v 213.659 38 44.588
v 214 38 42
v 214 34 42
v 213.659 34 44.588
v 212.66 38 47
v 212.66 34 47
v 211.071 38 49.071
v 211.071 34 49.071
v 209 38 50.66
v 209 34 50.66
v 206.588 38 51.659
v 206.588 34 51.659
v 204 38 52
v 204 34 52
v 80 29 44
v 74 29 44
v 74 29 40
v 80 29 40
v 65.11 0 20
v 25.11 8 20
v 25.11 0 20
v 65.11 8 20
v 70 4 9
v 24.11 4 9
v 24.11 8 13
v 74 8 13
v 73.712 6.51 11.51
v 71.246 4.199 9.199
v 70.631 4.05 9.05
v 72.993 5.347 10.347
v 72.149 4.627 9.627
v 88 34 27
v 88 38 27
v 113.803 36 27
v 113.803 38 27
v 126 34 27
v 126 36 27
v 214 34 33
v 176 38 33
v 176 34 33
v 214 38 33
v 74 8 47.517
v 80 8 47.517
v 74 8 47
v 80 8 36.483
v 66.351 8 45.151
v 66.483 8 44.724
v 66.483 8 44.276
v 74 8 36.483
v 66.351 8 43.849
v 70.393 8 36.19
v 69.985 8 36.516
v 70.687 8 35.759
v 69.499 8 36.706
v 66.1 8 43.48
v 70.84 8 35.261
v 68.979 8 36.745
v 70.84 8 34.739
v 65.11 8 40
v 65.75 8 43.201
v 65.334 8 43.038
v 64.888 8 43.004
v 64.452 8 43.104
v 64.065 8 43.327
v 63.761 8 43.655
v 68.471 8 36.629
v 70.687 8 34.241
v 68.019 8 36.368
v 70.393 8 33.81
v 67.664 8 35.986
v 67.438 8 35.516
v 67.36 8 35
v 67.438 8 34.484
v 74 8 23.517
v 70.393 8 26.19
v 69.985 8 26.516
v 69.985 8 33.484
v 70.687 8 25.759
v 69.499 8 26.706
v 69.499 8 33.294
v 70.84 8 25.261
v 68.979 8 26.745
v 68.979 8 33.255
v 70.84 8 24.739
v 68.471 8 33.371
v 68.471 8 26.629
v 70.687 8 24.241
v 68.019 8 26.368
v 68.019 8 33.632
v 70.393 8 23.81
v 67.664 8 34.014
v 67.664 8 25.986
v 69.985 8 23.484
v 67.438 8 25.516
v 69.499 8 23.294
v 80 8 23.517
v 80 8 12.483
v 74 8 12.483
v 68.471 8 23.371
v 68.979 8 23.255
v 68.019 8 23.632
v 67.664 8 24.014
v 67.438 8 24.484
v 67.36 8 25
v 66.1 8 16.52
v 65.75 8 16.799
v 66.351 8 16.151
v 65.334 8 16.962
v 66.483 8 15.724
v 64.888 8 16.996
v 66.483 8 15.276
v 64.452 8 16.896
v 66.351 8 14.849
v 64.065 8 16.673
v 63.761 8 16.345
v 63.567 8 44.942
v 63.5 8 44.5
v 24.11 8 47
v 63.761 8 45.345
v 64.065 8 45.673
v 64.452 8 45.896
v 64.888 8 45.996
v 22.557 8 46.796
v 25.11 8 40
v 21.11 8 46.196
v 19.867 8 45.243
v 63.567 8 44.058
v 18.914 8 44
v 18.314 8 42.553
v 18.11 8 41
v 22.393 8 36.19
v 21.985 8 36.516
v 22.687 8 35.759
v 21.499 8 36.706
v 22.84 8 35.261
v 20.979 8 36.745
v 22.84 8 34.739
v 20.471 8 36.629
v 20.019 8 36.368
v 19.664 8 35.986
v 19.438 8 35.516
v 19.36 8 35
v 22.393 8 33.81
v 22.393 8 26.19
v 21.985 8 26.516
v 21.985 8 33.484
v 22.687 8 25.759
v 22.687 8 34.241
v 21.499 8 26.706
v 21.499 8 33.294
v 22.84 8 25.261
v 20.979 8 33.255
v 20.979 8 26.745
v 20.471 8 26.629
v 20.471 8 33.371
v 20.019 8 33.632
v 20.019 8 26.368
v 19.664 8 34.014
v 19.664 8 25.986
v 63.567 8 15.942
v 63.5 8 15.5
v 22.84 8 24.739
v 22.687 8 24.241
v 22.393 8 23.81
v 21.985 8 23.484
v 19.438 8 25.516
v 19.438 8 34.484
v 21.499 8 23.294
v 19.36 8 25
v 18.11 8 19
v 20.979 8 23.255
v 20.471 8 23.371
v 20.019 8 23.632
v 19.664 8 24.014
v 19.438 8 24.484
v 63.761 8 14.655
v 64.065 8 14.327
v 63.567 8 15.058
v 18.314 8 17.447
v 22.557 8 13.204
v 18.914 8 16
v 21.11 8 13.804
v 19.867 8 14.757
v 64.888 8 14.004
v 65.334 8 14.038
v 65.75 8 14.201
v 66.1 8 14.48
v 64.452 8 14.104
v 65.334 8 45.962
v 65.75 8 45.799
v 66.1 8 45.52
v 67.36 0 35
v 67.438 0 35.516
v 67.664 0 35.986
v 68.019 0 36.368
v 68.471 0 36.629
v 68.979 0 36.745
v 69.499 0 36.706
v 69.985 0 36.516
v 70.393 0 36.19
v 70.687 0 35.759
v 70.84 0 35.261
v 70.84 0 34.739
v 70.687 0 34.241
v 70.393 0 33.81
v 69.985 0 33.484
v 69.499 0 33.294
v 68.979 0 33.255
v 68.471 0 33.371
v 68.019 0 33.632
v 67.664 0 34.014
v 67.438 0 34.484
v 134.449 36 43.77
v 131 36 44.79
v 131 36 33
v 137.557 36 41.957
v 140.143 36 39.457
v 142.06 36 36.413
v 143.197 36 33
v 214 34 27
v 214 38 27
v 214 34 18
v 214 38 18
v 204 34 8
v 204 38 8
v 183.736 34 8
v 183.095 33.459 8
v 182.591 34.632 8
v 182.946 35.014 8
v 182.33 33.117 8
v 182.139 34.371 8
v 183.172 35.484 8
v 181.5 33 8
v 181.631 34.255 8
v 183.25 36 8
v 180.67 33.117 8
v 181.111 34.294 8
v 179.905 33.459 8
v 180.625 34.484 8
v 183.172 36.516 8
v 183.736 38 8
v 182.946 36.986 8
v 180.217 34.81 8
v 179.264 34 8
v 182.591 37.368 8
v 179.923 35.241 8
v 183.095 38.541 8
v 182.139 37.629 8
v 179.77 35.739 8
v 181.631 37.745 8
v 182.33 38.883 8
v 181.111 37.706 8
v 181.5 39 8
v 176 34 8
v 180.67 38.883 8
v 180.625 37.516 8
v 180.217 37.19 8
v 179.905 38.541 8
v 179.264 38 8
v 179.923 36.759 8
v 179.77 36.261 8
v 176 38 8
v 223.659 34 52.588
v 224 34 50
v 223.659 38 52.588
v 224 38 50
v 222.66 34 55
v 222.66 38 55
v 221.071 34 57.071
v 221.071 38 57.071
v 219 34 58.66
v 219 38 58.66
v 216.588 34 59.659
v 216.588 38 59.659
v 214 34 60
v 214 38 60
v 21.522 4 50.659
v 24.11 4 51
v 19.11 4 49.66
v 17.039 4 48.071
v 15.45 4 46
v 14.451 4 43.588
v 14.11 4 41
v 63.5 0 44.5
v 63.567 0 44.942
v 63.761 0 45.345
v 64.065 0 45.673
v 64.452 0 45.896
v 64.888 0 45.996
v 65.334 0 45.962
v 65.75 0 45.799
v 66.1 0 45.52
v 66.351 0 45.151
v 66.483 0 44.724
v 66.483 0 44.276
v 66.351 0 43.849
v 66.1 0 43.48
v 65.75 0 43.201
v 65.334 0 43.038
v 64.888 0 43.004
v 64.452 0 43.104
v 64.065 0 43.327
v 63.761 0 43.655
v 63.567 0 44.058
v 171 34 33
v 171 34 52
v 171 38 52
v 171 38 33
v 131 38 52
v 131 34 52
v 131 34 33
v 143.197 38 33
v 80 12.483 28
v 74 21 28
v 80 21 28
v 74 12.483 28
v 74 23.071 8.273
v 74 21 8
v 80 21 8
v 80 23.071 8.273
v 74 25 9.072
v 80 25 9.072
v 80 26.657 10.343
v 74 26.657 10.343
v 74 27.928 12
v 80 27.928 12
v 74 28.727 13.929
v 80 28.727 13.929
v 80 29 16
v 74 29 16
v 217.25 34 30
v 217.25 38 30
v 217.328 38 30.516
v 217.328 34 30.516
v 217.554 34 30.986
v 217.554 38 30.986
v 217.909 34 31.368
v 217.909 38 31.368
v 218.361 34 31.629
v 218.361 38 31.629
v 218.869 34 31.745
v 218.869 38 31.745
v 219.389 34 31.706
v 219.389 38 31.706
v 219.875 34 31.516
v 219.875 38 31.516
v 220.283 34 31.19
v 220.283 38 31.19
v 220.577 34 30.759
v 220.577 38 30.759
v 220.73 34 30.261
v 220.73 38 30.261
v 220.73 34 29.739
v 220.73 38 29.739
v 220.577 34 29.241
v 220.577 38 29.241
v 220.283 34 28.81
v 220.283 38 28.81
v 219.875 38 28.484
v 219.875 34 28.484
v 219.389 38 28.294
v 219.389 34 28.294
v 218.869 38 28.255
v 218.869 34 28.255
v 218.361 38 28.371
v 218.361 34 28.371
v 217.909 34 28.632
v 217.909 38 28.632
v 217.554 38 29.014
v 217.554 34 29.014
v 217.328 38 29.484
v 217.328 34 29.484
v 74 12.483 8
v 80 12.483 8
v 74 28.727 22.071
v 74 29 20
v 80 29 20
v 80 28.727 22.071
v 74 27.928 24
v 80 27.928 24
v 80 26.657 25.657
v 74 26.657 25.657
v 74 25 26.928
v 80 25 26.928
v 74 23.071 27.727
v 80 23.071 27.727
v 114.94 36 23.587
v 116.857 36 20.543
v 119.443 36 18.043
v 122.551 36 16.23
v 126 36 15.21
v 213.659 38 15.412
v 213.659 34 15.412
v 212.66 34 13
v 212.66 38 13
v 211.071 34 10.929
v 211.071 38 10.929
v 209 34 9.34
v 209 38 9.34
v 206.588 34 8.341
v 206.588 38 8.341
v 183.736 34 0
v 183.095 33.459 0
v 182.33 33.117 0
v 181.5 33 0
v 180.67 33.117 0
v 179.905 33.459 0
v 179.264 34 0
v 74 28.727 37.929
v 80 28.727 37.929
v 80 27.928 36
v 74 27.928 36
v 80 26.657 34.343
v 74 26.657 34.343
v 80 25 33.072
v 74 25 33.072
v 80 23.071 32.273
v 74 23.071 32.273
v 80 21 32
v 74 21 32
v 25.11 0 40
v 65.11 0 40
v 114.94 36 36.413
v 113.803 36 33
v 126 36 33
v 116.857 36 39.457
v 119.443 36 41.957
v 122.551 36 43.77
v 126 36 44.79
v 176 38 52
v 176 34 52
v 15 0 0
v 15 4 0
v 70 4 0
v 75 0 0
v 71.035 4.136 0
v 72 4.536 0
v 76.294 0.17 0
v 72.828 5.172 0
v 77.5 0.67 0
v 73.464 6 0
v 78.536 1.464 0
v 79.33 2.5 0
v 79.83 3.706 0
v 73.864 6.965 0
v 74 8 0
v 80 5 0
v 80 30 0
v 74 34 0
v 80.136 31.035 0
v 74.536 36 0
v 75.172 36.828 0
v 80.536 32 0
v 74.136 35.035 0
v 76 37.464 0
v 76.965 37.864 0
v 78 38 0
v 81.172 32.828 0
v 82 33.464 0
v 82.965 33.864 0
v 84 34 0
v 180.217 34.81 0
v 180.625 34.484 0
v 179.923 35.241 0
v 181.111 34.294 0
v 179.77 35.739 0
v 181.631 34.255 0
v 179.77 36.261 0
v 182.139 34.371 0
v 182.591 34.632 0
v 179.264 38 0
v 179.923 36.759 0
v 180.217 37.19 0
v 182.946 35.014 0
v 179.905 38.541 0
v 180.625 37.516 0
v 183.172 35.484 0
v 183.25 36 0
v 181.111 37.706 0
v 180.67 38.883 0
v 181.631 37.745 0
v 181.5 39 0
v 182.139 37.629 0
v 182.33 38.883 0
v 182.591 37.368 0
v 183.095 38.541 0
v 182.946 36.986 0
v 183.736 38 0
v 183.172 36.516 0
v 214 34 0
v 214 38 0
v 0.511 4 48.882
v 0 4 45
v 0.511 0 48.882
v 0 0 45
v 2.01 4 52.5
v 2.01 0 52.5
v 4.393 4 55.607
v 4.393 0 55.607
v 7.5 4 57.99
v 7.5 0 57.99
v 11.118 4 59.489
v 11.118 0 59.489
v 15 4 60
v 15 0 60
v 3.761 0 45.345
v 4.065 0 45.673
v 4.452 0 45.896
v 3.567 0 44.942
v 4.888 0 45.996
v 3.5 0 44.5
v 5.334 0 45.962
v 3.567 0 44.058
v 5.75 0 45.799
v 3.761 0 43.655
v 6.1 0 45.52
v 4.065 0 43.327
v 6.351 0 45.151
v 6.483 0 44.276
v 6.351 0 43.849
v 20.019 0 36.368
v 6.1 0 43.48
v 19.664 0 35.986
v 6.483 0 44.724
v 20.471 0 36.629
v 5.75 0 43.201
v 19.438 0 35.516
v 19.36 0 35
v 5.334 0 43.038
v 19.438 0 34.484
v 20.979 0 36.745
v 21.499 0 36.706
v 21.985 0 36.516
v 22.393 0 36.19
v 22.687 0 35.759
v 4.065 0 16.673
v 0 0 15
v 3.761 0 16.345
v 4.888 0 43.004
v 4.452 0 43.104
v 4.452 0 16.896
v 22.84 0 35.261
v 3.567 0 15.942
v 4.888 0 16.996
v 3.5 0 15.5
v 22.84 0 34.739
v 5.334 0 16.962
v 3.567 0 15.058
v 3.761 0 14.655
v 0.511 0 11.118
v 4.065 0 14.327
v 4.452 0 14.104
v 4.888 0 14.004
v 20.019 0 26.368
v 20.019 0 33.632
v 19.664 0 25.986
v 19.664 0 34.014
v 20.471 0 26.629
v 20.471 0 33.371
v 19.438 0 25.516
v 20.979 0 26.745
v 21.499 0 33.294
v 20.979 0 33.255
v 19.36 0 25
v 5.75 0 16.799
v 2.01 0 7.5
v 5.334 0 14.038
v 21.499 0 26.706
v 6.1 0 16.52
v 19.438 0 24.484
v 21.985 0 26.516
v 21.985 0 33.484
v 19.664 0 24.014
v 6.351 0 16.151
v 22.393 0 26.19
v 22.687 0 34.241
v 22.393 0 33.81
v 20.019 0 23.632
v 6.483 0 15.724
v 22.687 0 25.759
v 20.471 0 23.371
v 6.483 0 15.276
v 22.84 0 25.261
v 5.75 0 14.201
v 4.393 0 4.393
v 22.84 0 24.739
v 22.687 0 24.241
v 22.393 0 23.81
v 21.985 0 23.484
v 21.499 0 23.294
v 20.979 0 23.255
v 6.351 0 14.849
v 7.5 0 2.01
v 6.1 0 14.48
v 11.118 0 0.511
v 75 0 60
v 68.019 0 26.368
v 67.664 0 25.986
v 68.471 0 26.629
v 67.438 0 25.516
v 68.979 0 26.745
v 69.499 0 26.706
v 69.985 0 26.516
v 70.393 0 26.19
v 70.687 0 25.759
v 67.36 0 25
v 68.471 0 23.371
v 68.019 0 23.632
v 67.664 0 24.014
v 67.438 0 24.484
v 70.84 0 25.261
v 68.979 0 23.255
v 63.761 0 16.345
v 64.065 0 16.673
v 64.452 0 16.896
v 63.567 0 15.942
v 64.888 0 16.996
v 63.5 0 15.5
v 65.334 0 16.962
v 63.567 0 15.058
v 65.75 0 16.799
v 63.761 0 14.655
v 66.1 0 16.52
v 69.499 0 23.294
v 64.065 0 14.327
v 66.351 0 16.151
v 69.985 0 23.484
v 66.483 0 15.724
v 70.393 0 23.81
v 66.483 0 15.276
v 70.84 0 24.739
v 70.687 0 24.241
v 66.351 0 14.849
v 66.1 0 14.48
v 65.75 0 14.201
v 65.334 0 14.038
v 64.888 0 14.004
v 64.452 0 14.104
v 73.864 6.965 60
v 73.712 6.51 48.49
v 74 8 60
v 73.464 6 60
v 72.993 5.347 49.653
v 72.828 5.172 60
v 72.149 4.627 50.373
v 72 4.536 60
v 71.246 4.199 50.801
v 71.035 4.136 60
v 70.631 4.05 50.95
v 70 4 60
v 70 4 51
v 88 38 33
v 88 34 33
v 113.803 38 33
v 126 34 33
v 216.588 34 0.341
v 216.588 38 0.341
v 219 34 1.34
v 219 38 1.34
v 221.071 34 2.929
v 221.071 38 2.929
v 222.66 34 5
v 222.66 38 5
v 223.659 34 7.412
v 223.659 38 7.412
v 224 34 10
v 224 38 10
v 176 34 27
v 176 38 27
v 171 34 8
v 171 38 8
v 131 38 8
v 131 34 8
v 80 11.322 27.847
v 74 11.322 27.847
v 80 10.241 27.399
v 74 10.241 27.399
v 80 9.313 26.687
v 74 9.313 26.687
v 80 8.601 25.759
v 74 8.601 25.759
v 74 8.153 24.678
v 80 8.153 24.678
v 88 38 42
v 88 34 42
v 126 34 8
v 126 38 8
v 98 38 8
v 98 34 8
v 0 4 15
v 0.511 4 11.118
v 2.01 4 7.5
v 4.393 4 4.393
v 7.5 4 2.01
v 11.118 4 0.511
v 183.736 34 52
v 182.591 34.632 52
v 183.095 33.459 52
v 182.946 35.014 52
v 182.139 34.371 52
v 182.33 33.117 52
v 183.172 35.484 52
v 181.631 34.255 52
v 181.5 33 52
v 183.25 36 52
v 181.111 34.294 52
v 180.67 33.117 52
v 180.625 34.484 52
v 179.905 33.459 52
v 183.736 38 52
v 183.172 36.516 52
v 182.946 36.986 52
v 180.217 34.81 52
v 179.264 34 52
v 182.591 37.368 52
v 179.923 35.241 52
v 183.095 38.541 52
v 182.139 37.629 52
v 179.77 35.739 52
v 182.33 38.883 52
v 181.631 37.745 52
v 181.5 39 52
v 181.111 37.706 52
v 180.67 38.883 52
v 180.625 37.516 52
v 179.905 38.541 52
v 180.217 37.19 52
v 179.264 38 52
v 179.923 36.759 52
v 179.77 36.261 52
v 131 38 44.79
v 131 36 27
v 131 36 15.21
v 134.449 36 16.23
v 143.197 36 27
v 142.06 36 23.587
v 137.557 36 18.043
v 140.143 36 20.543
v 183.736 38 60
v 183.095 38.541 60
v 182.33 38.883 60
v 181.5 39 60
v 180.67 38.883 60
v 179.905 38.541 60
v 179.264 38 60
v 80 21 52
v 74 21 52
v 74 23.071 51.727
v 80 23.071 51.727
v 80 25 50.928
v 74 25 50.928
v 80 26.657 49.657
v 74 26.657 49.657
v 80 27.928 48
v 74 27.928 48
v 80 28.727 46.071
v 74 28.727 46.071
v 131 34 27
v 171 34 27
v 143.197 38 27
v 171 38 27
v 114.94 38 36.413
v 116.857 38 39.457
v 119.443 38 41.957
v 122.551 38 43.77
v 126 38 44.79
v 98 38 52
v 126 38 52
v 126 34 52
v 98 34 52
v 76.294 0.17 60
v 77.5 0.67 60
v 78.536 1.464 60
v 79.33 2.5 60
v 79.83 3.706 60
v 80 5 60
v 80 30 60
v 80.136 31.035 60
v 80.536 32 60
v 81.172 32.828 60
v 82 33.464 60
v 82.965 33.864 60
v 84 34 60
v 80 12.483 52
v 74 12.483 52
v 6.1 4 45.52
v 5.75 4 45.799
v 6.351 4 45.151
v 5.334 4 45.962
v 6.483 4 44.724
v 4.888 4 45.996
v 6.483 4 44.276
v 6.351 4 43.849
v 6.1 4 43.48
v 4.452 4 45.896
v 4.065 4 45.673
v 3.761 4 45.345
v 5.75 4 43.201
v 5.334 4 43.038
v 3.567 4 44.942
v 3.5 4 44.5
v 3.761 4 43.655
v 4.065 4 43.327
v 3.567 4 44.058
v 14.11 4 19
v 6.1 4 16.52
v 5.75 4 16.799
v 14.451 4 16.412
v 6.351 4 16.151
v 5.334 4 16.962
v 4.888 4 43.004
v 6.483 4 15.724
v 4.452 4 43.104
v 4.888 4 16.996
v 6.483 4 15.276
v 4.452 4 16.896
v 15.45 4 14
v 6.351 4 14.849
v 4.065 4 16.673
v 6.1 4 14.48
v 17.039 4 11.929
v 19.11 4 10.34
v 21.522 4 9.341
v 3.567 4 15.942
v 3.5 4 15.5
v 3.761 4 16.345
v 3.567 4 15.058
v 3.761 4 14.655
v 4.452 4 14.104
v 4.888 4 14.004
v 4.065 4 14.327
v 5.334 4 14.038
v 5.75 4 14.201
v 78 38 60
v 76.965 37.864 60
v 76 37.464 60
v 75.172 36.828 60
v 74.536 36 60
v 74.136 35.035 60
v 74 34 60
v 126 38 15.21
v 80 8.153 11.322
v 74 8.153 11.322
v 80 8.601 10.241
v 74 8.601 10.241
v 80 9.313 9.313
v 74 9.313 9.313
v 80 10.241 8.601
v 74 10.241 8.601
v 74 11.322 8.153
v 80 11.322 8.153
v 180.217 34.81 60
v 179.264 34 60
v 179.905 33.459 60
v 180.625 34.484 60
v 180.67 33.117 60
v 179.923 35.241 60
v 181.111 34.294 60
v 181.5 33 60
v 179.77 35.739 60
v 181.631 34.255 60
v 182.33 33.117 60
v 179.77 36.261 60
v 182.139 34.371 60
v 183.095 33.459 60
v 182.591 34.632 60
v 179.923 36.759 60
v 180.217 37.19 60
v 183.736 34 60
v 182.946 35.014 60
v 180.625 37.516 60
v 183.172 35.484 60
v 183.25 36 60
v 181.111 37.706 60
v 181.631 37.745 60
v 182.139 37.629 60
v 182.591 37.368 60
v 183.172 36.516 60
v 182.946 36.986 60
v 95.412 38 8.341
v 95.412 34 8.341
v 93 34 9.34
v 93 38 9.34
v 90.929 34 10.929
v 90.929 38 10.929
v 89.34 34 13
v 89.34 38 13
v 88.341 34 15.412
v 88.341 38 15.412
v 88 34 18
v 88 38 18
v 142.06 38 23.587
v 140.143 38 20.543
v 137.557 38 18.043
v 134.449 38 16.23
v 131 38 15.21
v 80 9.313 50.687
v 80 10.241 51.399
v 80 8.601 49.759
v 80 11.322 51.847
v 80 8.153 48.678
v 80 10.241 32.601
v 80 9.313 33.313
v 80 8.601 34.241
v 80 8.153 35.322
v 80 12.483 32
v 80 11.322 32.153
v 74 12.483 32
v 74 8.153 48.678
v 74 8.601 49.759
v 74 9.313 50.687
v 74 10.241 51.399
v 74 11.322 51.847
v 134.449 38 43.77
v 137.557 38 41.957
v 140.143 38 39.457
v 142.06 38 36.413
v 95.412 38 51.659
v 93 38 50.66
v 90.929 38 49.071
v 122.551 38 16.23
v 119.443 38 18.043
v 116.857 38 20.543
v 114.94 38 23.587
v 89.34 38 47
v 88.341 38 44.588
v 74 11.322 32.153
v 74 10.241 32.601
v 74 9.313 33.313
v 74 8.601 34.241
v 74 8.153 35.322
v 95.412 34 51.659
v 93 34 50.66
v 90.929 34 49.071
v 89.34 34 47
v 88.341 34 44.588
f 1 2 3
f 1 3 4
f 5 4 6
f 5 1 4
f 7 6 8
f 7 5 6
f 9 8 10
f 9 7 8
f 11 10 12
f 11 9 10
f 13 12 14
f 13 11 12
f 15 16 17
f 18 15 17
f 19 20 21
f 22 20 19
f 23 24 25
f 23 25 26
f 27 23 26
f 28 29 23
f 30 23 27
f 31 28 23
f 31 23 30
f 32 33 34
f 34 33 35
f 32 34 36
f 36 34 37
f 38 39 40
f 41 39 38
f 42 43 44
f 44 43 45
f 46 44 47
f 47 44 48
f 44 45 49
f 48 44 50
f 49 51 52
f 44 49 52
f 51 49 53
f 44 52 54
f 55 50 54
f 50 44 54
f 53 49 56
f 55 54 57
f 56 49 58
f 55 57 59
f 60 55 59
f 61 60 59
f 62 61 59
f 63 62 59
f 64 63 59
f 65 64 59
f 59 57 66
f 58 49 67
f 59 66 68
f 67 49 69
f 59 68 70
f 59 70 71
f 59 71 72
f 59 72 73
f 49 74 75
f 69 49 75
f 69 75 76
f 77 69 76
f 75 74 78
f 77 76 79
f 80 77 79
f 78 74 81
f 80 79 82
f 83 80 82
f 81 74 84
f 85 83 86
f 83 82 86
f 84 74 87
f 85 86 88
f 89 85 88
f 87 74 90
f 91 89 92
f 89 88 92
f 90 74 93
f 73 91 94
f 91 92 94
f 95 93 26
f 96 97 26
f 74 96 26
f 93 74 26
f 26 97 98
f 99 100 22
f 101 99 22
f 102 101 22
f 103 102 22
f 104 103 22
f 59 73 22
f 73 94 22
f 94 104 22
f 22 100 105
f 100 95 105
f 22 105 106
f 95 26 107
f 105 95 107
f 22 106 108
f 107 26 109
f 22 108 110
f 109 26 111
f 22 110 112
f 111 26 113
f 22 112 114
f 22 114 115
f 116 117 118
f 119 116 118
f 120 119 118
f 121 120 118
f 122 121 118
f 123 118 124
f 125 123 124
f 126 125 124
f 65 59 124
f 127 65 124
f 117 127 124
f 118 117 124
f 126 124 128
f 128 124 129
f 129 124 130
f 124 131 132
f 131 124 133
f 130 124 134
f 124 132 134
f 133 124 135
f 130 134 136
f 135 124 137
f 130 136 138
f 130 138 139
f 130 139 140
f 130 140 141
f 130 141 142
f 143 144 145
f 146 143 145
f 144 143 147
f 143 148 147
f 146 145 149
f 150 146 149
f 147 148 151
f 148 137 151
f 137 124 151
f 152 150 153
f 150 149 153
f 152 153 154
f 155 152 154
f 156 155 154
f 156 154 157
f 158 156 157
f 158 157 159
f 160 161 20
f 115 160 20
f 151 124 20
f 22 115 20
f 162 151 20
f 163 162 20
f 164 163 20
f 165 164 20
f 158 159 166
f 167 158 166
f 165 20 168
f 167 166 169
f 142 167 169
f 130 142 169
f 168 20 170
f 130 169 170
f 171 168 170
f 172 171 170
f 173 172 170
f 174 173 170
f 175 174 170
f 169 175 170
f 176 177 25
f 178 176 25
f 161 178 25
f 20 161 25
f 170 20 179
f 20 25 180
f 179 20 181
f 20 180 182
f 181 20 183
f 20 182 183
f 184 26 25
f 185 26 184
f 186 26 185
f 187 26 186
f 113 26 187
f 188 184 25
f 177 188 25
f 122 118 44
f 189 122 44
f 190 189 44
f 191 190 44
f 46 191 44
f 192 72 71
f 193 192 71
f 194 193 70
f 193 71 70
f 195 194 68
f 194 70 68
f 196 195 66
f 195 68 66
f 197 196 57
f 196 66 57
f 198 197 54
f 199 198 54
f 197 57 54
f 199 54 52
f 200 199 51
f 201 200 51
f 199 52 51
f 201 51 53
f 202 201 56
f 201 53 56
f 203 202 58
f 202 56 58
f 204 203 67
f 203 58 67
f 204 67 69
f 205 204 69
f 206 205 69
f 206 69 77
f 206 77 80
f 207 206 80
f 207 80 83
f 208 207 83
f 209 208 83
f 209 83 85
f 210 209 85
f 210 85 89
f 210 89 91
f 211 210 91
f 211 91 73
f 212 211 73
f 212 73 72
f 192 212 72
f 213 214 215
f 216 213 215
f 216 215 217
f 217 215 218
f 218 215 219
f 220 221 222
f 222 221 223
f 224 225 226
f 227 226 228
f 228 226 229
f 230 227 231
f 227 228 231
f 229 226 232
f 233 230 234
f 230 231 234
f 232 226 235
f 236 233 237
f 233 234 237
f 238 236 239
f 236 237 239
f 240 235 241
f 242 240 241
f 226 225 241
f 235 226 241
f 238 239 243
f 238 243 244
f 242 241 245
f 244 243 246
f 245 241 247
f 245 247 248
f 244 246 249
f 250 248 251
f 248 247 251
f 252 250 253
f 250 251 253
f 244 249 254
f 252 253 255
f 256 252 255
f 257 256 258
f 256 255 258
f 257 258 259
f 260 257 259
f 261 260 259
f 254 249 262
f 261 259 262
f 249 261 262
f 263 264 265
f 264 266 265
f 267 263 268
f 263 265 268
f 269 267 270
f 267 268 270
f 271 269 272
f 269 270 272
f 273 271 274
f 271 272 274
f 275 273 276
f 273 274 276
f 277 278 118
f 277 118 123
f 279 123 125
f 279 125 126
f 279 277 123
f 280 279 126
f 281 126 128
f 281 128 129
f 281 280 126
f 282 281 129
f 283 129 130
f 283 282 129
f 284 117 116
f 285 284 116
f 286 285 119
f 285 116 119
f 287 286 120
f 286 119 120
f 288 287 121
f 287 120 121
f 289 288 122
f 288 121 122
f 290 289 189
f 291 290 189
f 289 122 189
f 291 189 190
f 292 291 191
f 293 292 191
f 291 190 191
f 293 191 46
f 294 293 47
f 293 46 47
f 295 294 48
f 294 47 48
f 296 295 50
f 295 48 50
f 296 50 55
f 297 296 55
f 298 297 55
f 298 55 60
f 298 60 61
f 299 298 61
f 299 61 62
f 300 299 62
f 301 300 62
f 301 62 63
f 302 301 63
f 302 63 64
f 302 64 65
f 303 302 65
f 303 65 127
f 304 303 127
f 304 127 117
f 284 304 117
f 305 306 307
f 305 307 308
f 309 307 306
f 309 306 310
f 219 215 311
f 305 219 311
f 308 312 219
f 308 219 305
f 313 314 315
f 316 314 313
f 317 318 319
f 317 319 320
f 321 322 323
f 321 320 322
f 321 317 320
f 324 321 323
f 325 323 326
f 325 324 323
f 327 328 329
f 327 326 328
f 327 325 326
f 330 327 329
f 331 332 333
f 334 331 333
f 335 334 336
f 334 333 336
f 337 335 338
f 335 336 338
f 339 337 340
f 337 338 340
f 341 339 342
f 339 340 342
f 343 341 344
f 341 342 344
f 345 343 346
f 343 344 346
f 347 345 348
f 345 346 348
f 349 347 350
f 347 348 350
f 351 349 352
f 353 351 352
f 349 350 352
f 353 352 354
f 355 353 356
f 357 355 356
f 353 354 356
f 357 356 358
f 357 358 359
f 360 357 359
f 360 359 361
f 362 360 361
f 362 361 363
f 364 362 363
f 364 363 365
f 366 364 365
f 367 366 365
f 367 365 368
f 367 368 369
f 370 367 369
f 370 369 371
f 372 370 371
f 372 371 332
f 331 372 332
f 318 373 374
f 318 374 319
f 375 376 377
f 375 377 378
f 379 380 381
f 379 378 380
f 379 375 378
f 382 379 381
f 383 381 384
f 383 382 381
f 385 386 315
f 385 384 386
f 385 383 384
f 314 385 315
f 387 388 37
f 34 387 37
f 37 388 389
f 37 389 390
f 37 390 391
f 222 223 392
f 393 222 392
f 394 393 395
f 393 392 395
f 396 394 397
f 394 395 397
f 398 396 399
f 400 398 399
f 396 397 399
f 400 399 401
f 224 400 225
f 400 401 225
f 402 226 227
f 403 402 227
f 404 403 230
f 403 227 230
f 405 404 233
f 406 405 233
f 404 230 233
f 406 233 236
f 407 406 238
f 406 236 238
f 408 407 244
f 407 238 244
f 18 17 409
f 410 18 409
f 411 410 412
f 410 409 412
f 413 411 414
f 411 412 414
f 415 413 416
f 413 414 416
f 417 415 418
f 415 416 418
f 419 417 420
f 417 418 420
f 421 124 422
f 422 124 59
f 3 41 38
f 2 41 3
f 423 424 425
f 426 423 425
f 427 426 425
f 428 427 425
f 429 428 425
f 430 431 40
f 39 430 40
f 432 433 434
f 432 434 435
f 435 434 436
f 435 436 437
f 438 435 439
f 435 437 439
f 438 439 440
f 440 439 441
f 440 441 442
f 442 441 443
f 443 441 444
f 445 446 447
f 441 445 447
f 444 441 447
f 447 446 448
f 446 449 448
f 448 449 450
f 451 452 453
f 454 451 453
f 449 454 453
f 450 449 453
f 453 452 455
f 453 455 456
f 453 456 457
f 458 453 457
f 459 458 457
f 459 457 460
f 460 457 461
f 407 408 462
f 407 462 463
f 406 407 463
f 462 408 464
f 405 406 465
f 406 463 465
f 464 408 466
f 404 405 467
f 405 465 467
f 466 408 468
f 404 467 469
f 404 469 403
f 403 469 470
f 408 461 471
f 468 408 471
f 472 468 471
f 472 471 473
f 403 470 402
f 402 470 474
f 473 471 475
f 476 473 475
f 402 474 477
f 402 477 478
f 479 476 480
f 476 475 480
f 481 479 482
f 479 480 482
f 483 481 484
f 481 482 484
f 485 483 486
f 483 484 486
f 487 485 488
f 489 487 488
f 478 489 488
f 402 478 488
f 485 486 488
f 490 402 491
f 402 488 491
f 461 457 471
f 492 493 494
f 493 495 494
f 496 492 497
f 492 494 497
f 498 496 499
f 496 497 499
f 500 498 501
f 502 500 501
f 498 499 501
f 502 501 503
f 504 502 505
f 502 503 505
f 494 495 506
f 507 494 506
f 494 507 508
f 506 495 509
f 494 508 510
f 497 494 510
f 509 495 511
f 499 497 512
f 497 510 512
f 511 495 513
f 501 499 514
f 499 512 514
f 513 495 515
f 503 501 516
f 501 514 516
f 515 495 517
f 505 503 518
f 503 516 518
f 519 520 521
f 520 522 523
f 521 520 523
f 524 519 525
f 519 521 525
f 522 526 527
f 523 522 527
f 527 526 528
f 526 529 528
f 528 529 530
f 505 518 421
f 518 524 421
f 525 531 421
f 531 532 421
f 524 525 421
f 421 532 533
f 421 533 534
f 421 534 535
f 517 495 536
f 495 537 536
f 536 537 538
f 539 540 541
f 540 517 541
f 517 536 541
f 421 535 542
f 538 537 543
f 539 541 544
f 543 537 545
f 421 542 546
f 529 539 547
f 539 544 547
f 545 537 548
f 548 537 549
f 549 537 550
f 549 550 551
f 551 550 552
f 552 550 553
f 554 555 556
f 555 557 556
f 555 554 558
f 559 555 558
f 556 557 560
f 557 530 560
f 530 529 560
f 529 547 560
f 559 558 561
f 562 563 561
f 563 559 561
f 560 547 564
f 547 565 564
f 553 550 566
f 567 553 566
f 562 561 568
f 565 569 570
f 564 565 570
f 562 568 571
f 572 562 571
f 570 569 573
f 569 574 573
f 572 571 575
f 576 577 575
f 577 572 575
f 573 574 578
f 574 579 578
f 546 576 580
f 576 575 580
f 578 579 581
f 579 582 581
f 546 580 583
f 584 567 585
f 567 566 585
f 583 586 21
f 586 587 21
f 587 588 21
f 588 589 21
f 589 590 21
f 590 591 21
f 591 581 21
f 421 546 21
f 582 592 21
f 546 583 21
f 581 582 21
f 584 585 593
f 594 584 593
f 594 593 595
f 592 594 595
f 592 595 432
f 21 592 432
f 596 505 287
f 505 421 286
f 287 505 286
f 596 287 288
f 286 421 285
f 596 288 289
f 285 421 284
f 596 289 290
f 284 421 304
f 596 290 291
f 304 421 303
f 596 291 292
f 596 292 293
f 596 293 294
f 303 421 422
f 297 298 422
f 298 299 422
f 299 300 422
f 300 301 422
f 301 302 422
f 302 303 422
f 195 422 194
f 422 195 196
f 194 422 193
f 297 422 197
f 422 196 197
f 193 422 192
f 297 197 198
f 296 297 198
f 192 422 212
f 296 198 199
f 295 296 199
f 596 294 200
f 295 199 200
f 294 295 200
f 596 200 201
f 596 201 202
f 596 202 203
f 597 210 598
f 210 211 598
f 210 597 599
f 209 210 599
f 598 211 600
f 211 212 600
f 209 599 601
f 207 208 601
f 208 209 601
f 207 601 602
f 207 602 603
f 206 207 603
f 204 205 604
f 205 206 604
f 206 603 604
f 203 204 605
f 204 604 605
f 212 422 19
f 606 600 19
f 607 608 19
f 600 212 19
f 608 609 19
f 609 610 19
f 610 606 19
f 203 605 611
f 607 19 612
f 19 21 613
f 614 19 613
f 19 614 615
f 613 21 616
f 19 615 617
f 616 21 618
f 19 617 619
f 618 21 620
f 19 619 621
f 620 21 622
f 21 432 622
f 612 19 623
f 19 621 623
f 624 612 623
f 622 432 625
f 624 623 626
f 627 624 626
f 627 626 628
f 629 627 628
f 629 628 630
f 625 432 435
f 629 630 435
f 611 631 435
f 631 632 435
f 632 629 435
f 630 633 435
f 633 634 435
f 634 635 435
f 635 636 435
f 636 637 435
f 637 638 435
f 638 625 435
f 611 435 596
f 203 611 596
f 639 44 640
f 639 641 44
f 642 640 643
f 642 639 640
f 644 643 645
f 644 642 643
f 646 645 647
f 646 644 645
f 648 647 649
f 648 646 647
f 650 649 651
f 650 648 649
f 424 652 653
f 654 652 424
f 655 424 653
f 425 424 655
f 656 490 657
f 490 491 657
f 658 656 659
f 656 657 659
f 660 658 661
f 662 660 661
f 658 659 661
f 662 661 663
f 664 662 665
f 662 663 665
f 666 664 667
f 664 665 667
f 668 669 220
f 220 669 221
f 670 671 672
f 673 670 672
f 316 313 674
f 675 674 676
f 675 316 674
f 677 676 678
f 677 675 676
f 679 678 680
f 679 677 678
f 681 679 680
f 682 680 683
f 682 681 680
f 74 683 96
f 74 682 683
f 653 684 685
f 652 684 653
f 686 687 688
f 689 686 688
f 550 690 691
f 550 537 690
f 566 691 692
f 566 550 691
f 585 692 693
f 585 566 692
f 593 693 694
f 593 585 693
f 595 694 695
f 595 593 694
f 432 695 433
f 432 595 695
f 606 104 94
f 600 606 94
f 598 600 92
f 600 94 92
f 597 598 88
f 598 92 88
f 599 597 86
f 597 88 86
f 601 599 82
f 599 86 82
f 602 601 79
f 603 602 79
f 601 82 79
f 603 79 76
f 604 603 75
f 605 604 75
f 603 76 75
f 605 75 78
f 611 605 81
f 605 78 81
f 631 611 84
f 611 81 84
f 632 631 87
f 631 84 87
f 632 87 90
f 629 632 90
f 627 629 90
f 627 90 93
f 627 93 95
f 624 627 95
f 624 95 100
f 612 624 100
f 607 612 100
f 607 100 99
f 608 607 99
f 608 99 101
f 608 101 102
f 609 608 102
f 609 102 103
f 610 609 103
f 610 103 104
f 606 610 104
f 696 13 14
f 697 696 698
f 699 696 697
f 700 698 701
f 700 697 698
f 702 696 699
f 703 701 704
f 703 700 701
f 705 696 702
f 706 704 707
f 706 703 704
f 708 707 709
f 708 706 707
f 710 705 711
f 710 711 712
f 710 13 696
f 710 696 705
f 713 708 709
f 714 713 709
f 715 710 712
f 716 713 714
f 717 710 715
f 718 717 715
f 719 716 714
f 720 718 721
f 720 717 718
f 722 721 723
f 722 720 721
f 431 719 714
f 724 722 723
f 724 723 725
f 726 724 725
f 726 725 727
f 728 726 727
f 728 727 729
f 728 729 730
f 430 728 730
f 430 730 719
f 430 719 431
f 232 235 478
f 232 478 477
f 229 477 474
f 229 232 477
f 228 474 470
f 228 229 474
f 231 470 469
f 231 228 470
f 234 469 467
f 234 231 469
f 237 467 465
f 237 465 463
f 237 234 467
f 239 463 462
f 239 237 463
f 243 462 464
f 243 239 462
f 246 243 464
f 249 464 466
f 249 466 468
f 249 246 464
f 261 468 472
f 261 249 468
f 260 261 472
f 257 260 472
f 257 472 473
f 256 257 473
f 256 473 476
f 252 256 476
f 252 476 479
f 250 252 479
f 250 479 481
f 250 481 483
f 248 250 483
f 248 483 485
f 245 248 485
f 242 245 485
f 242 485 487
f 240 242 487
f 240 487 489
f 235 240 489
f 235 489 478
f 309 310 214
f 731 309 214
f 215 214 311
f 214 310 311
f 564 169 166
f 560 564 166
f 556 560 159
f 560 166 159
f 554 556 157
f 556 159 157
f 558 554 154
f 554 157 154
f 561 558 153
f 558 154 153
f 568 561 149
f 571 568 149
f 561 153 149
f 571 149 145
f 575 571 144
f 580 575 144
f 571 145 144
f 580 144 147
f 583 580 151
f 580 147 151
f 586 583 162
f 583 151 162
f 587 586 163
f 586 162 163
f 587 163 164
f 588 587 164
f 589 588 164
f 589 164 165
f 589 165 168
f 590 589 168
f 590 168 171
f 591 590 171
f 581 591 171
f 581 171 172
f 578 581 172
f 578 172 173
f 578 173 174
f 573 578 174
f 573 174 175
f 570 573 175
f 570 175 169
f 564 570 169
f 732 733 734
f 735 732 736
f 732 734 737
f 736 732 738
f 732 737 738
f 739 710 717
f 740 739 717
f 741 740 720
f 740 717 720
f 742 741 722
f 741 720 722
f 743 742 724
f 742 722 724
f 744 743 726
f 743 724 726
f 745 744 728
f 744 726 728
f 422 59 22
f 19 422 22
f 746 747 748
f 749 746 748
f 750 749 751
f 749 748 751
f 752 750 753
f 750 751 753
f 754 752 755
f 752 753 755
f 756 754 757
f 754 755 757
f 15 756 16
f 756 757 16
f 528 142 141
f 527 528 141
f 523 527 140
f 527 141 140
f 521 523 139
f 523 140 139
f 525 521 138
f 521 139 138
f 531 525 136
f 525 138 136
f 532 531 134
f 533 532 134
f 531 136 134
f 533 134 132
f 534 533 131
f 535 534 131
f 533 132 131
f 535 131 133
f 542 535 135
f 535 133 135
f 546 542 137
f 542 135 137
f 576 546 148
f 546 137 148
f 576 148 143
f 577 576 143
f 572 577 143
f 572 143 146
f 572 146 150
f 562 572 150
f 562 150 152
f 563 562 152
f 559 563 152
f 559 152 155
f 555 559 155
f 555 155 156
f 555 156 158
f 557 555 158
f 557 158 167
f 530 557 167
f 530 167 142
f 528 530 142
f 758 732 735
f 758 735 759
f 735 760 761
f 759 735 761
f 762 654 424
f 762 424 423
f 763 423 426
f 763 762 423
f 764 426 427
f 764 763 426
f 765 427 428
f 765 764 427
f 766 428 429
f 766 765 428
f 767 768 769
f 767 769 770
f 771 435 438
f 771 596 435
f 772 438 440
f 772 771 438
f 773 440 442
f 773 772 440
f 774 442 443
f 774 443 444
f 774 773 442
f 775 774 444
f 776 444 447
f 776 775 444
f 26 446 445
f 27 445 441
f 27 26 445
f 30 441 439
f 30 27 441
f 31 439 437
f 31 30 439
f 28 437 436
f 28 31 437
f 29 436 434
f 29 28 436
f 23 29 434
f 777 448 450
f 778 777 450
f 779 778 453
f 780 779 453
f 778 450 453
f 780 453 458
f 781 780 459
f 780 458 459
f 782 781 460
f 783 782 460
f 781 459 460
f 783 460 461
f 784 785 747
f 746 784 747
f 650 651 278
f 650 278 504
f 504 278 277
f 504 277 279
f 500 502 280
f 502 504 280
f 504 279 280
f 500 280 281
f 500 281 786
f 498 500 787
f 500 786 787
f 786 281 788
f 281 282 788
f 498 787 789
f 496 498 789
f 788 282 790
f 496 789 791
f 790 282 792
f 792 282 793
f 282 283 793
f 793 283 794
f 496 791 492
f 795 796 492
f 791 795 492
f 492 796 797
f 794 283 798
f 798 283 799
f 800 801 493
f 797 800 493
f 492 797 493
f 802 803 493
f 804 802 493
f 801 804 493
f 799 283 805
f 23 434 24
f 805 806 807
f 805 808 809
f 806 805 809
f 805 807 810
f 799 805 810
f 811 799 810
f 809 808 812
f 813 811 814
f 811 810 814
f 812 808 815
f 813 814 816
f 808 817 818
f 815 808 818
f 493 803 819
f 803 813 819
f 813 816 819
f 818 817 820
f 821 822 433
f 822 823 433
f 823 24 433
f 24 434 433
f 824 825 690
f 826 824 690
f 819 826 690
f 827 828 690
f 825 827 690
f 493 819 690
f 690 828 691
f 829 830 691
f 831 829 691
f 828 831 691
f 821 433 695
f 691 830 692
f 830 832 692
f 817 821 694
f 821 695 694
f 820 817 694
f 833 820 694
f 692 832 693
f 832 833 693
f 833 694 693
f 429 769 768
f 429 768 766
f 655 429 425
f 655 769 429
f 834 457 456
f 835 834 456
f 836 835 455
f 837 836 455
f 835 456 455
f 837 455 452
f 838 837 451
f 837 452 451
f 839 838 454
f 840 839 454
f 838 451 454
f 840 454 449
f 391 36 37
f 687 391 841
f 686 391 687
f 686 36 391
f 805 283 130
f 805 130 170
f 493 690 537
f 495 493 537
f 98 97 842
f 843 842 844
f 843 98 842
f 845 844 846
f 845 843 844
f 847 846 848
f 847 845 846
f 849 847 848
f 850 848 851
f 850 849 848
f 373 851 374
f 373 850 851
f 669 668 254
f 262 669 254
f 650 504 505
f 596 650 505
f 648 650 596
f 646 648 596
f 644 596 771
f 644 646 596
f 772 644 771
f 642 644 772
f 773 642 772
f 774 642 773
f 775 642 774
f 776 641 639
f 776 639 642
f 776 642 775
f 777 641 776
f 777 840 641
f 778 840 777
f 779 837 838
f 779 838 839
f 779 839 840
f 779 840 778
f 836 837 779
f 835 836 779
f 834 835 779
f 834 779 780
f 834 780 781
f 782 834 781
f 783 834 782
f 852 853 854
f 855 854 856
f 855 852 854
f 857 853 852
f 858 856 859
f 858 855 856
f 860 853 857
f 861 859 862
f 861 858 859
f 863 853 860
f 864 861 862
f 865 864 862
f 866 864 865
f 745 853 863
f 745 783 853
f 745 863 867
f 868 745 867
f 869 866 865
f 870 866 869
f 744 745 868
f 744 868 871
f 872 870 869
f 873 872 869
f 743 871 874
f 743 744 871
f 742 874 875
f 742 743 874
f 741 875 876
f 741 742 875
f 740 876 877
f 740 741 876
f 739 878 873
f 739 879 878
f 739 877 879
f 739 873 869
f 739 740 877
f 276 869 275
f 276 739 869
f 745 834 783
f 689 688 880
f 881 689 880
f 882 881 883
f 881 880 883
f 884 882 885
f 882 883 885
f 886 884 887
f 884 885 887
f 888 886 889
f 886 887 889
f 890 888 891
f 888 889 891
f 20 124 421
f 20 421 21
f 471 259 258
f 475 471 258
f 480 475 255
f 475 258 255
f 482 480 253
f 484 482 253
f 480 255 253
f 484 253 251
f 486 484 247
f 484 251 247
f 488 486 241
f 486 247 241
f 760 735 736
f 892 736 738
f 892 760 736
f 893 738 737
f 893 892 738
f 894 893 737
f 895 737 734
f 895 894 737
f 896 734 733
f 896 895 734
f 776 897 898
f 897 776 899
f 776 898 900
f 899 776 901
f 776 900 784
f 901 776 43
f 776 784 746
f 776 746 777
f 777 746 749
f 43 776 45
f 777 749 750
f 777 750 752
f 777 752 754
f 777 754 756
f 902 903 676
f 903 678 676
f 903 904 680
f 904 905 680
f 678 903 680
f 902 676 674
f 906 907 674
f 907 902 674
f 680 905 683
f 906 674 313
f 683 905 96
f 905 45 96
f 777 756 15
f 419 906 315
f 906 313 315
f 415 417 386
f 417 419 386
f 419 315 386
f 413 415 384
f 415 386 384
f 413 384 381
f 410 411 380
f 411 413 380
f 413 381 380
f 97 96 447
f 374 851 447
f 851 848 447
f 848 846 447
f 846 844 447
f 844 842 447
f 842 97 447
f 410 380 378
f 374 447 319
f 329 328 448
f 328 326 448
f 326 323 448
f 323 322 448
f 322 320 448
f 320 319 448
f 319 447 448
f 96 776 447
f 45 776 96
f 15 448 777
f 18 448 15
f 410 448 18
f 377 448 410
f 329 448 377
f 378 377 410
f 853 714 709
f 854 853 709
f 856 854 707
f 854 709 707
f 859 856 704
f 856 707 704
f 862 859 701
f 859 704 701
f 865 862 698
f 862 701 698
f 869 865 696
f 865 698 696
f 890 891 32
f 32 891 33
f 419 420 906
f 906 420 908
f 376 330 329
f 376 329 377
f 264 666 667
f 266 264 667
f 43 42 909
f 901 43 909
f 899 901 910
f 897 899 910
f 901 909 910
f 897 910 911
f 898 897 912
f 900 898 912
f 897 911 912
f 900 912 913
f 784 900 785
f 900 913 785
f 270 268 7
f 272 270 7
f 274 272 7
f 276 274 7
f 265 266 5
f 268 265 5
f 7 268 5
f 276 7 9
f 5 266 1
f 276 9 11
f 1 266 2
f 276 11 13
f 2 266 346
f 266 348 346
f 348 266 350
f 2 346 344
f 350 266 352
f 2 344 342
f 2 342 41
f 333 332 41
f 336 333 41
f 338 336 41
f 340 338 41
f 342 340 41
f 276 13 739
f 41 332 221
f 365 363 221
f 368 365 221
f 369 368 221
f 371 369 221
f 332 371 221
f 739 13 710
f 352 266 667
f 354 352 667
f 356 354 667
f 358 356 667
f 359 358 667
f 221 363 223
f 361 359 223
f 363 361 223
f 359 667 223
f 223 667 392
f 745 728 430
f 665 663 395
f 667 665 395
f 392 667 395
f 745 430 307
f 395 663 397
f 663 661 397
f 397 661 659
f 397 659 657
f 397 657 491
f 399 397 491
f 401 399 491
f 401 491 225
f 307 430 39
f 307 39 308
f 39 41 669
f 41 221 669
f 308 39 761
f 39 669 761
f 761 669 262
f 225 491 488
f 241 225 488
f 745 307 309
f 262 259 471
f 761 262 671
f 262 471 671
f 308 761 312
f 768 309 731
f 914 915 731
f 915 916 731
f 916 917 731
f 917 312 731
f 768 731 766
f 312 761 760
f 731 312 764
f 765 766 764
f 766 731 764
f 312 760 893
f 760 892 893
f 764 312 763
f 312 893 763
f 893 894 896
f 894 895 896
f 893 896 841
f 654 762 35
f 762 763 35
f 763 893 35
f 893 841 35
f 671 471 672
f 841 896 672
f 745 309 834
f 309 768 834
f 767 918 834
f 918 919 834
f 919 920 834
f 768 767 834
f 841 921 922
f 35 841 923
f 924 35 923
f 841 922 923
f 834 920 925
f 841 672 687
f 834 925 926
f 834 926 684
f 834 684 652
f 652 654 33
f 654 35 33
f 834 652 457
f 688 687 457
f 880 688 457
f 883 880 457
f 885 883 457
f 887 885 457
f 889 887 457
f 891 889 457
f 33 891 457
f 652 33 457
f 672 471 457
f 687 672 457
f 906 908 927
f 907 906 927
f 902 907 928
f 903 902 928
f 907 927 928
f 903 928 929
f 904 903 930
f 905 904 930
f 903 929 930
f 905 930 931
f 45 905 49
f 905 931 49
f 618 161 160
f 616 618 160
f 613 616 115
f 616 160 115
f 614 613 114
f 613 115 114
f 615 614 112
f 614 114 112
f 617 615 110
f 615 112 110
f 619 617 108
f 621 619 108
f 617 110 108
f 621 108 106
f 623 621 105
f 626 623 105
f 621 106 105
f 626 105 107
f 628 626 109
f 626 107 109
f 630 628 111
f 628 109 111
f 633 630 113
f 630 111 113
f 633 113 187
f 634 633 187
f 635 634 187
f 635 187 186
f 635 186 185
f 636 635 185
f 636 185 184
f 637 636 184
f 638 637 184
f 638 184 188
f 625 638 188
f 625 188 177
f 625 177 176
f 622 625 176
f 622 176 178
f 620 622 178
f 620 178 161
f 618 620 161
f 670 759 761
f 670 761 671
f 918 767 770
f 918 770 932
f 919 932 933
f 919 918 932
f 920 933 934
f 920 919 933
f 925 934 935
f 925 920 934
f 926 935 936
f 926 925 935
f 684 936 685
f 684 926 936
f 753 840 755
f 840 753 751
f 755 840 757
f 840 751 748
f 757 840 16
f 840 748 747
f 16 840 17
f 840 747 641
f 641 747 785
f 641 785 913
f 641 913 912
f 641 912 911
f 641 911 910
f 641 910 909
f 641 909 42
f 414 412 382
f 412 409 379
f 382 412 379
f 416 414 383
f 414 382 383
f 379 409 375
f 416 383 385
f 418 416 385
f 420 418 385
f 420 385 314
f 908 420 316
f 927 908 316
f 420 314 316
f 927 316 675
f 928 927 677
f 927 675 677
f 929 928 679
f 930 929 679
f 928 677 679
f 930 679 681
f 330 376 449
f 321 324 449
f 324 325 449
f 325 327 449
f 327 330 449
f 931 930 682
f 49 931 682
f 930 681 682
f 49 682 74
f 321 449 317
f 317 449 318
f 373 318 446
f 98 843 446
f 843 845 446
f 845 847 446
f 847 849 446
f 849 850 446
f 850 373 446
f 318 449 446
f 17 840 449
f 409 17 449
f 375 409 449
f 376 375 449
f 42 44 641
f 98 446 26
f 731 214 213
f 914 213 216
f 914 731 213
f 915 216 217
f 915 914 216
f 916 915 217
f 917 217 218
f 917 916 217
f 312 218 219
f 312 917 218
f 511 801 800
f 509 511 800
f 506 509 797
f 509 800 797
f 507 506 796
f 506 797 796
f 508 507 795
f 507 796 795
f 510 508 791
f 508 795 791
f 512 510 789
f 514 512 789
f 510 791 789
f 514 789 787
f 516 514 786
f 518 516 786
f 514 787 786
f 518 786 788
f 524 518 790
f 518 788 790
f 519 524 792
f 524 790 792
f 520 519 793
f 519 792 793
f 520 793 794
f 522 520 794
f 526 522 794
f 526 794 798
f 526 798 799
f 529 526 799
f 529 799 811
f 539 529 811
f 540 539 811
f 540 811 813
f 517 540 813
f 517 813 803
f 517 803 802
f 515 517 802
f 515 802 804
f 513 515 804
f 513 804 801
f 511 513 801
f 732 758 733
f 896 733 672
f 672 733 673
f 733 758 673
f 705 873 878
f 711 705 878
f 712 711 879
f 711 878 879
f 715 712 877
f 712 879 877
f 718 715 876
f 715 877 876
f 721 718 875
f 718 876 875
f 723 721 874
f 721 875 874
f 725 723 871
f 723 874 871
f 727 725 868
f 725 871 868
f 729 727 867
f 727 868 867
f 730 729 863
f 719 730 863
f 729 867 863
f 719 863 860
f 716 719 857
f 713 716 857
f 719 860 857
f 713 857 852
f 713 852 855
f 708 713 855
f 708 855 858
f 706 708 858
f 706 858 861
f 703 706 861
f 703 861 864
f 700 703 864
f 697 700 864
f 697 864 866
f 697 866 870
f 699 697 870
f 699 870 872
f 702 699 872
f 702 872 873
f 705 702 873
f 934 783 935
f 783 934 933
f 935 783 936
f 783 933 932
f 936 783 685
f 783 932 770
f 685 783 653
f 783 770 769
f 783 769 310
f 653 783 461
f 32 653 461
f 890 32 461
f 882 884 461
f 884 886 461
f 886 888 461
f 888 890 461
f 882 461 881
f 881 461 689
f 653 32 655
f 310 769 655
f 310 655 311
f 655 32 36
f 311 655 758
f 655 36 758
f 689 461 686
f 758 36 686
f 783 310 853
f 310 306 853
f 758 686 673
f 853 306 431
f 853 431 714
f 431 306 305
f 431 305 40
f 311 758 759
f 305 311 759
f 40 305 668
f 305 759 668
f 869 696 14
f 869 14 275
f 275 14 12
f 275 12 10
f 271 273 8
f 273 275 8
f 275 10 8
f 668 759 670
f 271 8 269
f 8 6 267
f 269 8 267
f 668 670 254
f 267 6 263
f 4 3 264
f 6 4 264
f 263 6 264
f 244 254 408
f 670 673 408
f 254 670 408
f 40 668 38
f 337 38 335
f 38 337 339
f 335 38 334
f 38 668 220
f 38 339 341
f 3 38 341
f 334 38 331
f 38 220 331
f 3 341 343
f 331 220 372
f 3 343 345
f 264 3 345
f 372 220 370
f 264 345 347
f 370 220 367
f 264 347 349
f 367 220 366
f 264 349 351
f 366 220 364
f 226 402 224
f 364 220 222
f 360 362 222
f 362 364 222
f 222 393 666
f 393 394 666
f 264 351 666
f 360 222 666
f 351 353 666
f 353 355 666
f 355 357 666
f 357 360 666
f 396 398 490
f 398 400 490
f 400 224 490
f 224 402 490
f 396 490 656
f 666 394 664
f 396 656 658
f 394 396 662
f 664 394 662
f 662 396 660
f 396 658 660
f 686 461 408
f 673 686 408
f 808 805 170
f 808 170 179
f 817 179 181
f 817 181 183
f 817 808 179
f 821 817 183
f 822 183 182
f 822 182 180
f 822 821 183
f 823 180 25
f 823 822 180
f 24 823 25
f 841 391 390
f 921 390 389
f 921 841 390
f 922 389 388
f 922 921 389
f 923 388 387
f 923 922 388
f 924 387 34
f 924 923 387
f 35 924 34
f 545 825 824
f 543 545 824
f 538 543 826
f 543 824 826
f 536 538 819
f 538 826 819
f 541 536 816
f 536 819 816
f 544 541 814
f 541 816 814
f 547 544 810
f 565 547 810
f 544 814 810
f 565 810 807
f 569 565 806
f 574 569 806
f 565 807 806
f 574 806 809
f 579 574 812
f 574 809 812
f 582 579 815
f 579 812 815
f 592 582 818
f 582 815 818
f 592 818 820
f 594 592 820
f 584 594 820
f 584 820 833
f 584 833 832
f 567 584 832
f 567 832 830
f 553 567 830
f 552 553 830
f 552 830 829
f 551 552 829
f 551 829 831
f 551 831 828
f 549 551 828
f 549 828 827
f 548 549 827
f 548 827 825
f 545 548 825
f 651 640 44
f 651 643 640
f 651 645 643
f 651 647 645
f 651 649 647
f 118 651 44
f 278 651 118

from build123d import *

# Parameters (mm, degrees)
Y_KSEKLIK_EKSTR_ZYON1_DEPTH     = 60
KES_EKSTR_ZYON1_DEPTH           = 60
IZIM3_R                         = 1.5
KES_EKSTR_ZYON2_DEPTH           = 60
RADYUS1_R                       = 15
RADYUS2_R                       = 5
IZIM4_R                         = 1.75
IZIM4_W                         = 40
IZIM4_H                         = 20
KES_EKSTR_ZYON3_DEPTH           = 60
Y_KSEKLIK_EKSTR_ZYON2_START     = 4
IZIM5_R                         = 1.75
IZIM5_R_2                       = 1.5
IZIM5_W                         = 40
IZIM5_H                         = 20
Y_KSEKLIK_EKSTR_ZYON2_DEPTH     = 4
PAH1_SIZE                       = 4
RADYUS3_R                       = 4
KES_EKSTR_ZYON4_DEPTH           = 4
Y_KSEKLIK_EKSTR_ZYON3_START     = -4
Y_KSEKLIK_EKSTR_ZYON3_OUTLINE_W = 5
Y_KSEKLIK_EKSTR_ZYON3_OUTLINE_H = 19
Y_KSEKLIK_EKSTR_ZYON3_DEPTH     = 4
IZIM8_R                         = 15
Y_KSEKLIK_EKSTR_ZYON4_DEPTH     = 2
Y_KSEKLIK_EKSTR_ZYON5_START     = -8
Y_KSEKLIK_EKSTR_ZYON5_DEPTH     = 8
IZIM10_R                        = 1.75
KES_EKSTR_ZYON5_DEPTH           = 10
Y_KSEKLIK_EKSTR_ZYON6_START     = -8
Y_KSEKLIK_EKSTR_ZYON6_DEPTH     = 8
KES_EKSTR_ZYON6_START           = -10
IZIM12_R                        = 1.75
KES_EKSTR_ZYON6_DEPTH           = 10
IZIM13_R                        = 1.75
KES_EKSTR_ZYON7_DEPTH           = 10
RADYUS4_R                       = 10


# Read off the part's stored shape, not the designer's step: Yükseklik-Ekstrüzyon3, Yükseklik-Ekstrüzyon5, Yükseklik-Ekstrüzyon6
with BuildPart() as part:
    # Çizim1 → Yükseklik-Ekstrüzyon1 (new body)
    with BuildSketch(Plane.XY):
        with BuildLine():
            Line((0, 0), (80, 0))
            Line((80, 0), (80, 30))
            ThreePointArc((80, 30), (81.171572875, 32.828427125), (84, 34))
            Line((84, 34), (224, 34))
            Line((224, 34), (224, 38))
            Line((224, 38), (78, 38))
            ThreePointArc((78, 38), (75.171572875, 36.828427125), (74, 34))
            Line((74, 34), (74, 4))
            Line((74, 4), (0, 4))
            Line((0, 4), (0, 0))
        make_face()
    extrude(amount=Y_KSEKLIK_EKSTR_ZYON1_DEPTH)

    # Çizim2 → Kes-Ekstrüzyon1 (cut)
    with BuildSketch(Plane.ZY.offset(-74)):
        with BuildLine():
            Line((16, 29), (20, 29))
            ThreePointArc((20, 29), (25.656854249, 26.656854249), (28, 21))
            Line((28, 21), (28, 12.482548154))
            ThreePointArc((28, 12.482548154), (26.687092043, 9.312907957), (23.517451846, 8))
            Line((23.517451846, 8), (12.482548154, 8))
            ThreePointArc((12.482548154, 8), (9.312907957, 9.312907957), (8, 12.482548154))
            Line((8, 12.482548154), (8, 21))
            ThreePointArc((8, 21), (10.343145751, 26.656854249), (16, 29))
        make_face()
        with BuildLine():
            Line((32, 21), (32, 12.482548154))
            ThreePointArc((32, 12.482548154), (33.312907957, 9.312907957), (36.482548154, 8))
            Line((36.482548154, 8), (47.517451846, 8))
            ThreePointArc((47.517451846, 8), (50.687092043, 9.312907957), (52, 12.482548154))
            Line((52, 12.482548154), (52, 21))
            ThreePointArc((52, 21), (49.656854249, 26.656854249), (44, 29))
            Line((44, 29), (40, 29))
            ThreePointArc((40, 29), (34.343145751, 26.656854249), (32, 21))
        make_face()
    extrude(amount=-KES_EKSTR_ZYON1_DEPTH, mode=Mode.SUBTRACT)

    # Çizim3 → Kes-Ekstrüzyon2 (cut)
    with BuildSketch(Plane(origin=(0, 4, 0), x_dir=(1, 0, 0), z_dir=(0, 1, 0))):
        with Locations(Location((5, -15.5, 0), (0, 0, 180))):
            Circle(IZIM3_R)
        with Locations(Location((5, -44.5, 0), (0, 0, 180))):
            Circle(IZIM3_R)
        with Locations(Location((65, -15.5, 0), (0, 0, 180))):
            Circle(IZIM3_R)
        with Locations(Location((65, -44.5, 0), (0, 0, 180))):
            Circle(IZIM3_R)
    extrude(amount=-KES_EKSTR_ZYON2_DEPTH, mode=Mode.SUBTRACT)

    # Radyus1
    radyus1_edges = [part.edges().sort_by_distance(p)[0] for p in [
        (0, 2, 0),
        (0, 2, 60),
    ]]
    fillet(radyus1_edges, radius=RADYUS1_R)

    # Radyus2
    radyus2_edges = [part.edges().sort_by_distance(p)[0] for p in [
        (80, 0, 30),
    ]]
    fillet(radyus2_edges, radius=RADYUS2_R)

    # Çizim4 → Kes-Ekstrüzyon3 (cut)
    with BuildSketch(Plane(origin=(0, 4, 0), x_dir=(1, 0, 0), z_dir=(0, 1, 0))):
        with Locations(Location((21.11, -25, 0), (0, 0, 180))):
            Circle(IZIM4_R)
        with Locations(Location((21.11, -35, 0), (0, 0, 180))):
            Circle(IZIM4_R)
        with Locations(Location((69.11, -25, 0), (0, 0, 180))):
            Circle(IZIM4_R)
        with Locations(Location((69.11, -35, 0), (0, 0, 180))):
            Circle(IZIM4_R)
        with Locations((45.11, -30)):
            Rectangle(IZIM4_W, IZIM4_H)
    extrude(amount=-KES_EKSTR_ZYON3_DEPTH, mode=Mode.SUBTRACT)

    # Çizim5 → Yükseklik-Ekstrüzyon2 (add)
    with BuildSketch(Plane(origin=(0, 4, 0), x_dir=(1, 0, 0), z_dir=(0, 1, 0)).offset(Y_KSEKLIK_EKSTR_ZYON2_START)):
        with BuildLine():
            Line((24.11, -13), (74, -13))
            Line((74, -13), (74, -47))
            Line((74, -47), (24.11, -47))
            ThreePointArc((24.11, -47), (19.867359313, -45.242640687), (18.11, -41))
            Line((18.11, -41), (18.11, -19))
            ThreePointArc((18.11, -19), (19.867359313, -14.757359313), (24.11, -13))
        make_face()
        with Locations(Location((21.11, -25, 0), (0, 0, 180))):
            Circle(IZIM5_R, mode=Mode.SUBTRACT)
        with Locations(Location((21.11, -35, 0), (0, 0, 180))):
            Circle(IZIM5_R, mode=Mode.SUBTRACT)
        with Locations(Location((65, -44.5, 0), (0, 0, 180))):
            Circle(IZIM5_R_2, mode=Mode.SUBTRACT)
        with Locations(Location((69.11, -25, 0), (0, 0, 180))):
            Circle(IZIM5_R, mode=Mode.SUBTRACT)
        with Locations(Location((69.11, -35, 0), (0, 0, 180))):
            Circle(IZIM5_R, mode=Mode.SUBTRACT)
        with Locations(Location((65, -15.5, 0), (0, 0, 180))):
            Circle(IZIM5_R_2, mode=Mode.SUBTRACT)
        with Locations((45.11, -30)):
            Rectangle(IZIM5_W, IZIM5_H, mode=Mode.SUBTRACT)
    extrude(amount=-Y_KSEKLIK_EKSTR_ZYON2_DEPTH)

    # Pah1
    pah1_edges = [part.edges().sort_by_distance(p)[0] for p in [
        (49.055, 4, 13),
        (19.867359313, 4, 14.757359313),
        (18.11, 4, 30),
        (19.867359313, 4, 45.242640687),
        (49.055, 4, 47),
    ]]
    chamfer(pah1_edges, length=PAH1_SIZE - 0.0001)  # a hair under: the kernel refuses the full size

    # Radyus3
    radyus3_edges = [part.edges().sort_by_distance(p)[0] for p in [
        (74, 4, 55.49995),
        (74, 4, 4.50005),
    ]]
    fillet(radyus3_edges, radius=RADYUS3_R - 0.0001)  # a hair under: the kernel refuses the full size

    # Çizim6 → Kes-Ekstrüzyon4 (cut)
    with BuildSketch(Plane(origin=(0, 38, 0), x_dir=(1, 0, 0), z_dir=(0, 1, 0))):
        with BuildLine():
            Line((204, -52), (98, -52))
            ThreePointArc((98, -52), (90.928932188, -49.071067812), (88, -42))
            Line((88, -42), (88, -33))
            Line((88, -33), (214, -33))
            Line((214, -33), (214, -42))
            ThreePointArc((214, -42), (211.071067812, -49.071067812), (204, -52))
        make_face()
        with BuildLine():
            Line((204, -8), (98, -8))
            ThreePointArc((98, -8), (90.928932188, -10.928932188), (88, -18))
            Line((88, -18), (88, -27))
            Line((88, -27), (214, -27))
            Line((214, -27), (214, -18))
            ThreePointArc((214, -18), (211.071067812, -10.928932188), (204, -8))
        make_face()
    extrude(amount=-KES_EKSTR_ZYON4_DEPTH, mode=Mode.SUBTRACT)

    # Yükseklik-Ekstrüzyon3 outline → Yükseklik-Ekstrüzyon3 (add)
    with BuildSketch(Plane(origin=(0, 38, 0), x_dir=(1, 0, 0), z_dir=(0, 1, 0)).offset(Y_KSEKLIK_EKSTR_ZYON3_START)):
        with Locations((173.5, -42.5)):
            Rectangle(Y_KSEKLIK_EKSTR_ZYON3_OUTLINE_W, Y_KSEKLIK_EKSTR_ZYON3_OUTLINE_H)
        with Locations((128.5, -42.5)):
            Rectangle(Y_KSEKLIK_EKSTR_ZYON3_OUTLINE_W, Y_KSEKLIK_EKSTR_ZYON3_OUTLINE_H)
        with Locations((173.5, -17.5)):
            Rectangle(Y_KSEKLIK_EKSTR_ZYON3_OUTLINE_W, Y_KSEKLIK_EKSTR_ZYON3_OUTLINE_H)
        with Locations((128.5, -17.5)):
            Rectangle(Y_KSEKLIK_EKSTR_ZYON3_OUTLINE_W, Y_KSEKLIK_EKSTR_ZYON3_OUTLINE_H)
    extrude(amount=Y_KSEKLIK_EKSTR_ZYON3_DEPTH)

    # Çizim8 → Yükseklik-Ekstrüzyon4 (add)
    with BuildSketch(Plane(origin=(0, 38, 0), x_dir=(1, 0, 0), z_dir=(0, 1, 0))):
        with Locations((128.5, -30)):
            Circle(IZIM8_R)
    extrude(amount=-Y_KSEKLIK_EKSTR_ZYON4_DEPTH)

    # Yükseklik-Ekstrüzyon5 outline → Yükseklik-Ekstrüzyon5 (add)
    with BuildSketch(Plane.XY.offset(60).offset(Y_KSEKLIK_EKSTR_ZYON5_START)):
        with BuildLine():
            Line((179.263932023, 38), (183.736067977, 38))
            ThreePointArc((183.736067977, 38), (181.5, 39), (179.263932023, 38))
        make_face()
        with BuildLine():
            Line((183.736067977, 34), (179.263932023, 34))
            ThreePointArc((179.263932023, 34), (181.5, 33), (183.736067977, 34))
        make_face()
    extrude(amount=Y_KSEKLIK_EKSTR_ZYON5_DEPTH)

    # Çizim10 → Kes-Ekstrüzyon5 (cut)
    with BuildSketch(Plane.XY.offset(60)):
        with Locations((181.5, 36)):
            Circle(IZIM10_R)
    extrude(amount=-KES_EKSTR_ZYON5_DEPTH, mode=Mode.SUBTRACT)

    # Yükseklik-Ekstrüzyon6 outline → Yükseklik-Ekstrüzyon6 (add)
    with BuildSketch(Plane(origin=(0, 0, 0), x_dir=(-1, 0, 0), z_dir=(0, 0, -1)).offset(Y_KSEKLIK_EKSTR_ZYON6_START)):
        with BuildLine():
            Line((-183.736067977, 38), (-179.263932023, 38))
            ThreePointArc((-179.263932023, 38), (-181.5, 39), (-183.736067977, 38))
        make_face()
        with BuildLine():
            Line((-179.263932023, 34), (-183.736067977, 34))
            ThreePointArc((-183.736067977, 34), (-181.5, 33), (-179.263932023, 34))
        make_face()
    extrude(amount=Y_KSEKLIK_EKSTR_ZYON6_DEPTH)

    # Çizim12 → Kes-Ekstrüzyon6 (cut)
    with BuildSketch(Plane(origin=(0, 0, 0), x_dir=(-1, 0, 0), z_dir=(0, 0, -1)).offset(KES_EKSTR_ZYON6_START)):
        with Locations(Location((-181.5, 36, 0), (0, 0, 180))):
            Circle(IZIM12_R)
    extrude(amount=KES_EKSTR_ZYON6_DEPTH, mode=Mode.SUBTRACT)

    # Çizim13 → Kes-Ekstrüzyon7 (cut)
    with BuildSketch(Plane(origin=(0, 38, 0), x_dir=(1, 0, 0), z_dir=(0, 1, 0))):
        with Locations(Location((219, -30, 0), (0, 0, 180))):
            Circle(IZIM13_R)
    extrude(amount=-KES_EKSTR_ZYON7_DEPTH, mode=Mode.SUBTRACT)

    # Radyus4
    radyus4_edges = [part.edges().sort_by_distance(p)[0] for p in [
        (224, 36, 0),
        (224, 36, 60),
    ]]
    fillet(radyus4_edges, radius=RADYUS4_R)


solid = part.part
